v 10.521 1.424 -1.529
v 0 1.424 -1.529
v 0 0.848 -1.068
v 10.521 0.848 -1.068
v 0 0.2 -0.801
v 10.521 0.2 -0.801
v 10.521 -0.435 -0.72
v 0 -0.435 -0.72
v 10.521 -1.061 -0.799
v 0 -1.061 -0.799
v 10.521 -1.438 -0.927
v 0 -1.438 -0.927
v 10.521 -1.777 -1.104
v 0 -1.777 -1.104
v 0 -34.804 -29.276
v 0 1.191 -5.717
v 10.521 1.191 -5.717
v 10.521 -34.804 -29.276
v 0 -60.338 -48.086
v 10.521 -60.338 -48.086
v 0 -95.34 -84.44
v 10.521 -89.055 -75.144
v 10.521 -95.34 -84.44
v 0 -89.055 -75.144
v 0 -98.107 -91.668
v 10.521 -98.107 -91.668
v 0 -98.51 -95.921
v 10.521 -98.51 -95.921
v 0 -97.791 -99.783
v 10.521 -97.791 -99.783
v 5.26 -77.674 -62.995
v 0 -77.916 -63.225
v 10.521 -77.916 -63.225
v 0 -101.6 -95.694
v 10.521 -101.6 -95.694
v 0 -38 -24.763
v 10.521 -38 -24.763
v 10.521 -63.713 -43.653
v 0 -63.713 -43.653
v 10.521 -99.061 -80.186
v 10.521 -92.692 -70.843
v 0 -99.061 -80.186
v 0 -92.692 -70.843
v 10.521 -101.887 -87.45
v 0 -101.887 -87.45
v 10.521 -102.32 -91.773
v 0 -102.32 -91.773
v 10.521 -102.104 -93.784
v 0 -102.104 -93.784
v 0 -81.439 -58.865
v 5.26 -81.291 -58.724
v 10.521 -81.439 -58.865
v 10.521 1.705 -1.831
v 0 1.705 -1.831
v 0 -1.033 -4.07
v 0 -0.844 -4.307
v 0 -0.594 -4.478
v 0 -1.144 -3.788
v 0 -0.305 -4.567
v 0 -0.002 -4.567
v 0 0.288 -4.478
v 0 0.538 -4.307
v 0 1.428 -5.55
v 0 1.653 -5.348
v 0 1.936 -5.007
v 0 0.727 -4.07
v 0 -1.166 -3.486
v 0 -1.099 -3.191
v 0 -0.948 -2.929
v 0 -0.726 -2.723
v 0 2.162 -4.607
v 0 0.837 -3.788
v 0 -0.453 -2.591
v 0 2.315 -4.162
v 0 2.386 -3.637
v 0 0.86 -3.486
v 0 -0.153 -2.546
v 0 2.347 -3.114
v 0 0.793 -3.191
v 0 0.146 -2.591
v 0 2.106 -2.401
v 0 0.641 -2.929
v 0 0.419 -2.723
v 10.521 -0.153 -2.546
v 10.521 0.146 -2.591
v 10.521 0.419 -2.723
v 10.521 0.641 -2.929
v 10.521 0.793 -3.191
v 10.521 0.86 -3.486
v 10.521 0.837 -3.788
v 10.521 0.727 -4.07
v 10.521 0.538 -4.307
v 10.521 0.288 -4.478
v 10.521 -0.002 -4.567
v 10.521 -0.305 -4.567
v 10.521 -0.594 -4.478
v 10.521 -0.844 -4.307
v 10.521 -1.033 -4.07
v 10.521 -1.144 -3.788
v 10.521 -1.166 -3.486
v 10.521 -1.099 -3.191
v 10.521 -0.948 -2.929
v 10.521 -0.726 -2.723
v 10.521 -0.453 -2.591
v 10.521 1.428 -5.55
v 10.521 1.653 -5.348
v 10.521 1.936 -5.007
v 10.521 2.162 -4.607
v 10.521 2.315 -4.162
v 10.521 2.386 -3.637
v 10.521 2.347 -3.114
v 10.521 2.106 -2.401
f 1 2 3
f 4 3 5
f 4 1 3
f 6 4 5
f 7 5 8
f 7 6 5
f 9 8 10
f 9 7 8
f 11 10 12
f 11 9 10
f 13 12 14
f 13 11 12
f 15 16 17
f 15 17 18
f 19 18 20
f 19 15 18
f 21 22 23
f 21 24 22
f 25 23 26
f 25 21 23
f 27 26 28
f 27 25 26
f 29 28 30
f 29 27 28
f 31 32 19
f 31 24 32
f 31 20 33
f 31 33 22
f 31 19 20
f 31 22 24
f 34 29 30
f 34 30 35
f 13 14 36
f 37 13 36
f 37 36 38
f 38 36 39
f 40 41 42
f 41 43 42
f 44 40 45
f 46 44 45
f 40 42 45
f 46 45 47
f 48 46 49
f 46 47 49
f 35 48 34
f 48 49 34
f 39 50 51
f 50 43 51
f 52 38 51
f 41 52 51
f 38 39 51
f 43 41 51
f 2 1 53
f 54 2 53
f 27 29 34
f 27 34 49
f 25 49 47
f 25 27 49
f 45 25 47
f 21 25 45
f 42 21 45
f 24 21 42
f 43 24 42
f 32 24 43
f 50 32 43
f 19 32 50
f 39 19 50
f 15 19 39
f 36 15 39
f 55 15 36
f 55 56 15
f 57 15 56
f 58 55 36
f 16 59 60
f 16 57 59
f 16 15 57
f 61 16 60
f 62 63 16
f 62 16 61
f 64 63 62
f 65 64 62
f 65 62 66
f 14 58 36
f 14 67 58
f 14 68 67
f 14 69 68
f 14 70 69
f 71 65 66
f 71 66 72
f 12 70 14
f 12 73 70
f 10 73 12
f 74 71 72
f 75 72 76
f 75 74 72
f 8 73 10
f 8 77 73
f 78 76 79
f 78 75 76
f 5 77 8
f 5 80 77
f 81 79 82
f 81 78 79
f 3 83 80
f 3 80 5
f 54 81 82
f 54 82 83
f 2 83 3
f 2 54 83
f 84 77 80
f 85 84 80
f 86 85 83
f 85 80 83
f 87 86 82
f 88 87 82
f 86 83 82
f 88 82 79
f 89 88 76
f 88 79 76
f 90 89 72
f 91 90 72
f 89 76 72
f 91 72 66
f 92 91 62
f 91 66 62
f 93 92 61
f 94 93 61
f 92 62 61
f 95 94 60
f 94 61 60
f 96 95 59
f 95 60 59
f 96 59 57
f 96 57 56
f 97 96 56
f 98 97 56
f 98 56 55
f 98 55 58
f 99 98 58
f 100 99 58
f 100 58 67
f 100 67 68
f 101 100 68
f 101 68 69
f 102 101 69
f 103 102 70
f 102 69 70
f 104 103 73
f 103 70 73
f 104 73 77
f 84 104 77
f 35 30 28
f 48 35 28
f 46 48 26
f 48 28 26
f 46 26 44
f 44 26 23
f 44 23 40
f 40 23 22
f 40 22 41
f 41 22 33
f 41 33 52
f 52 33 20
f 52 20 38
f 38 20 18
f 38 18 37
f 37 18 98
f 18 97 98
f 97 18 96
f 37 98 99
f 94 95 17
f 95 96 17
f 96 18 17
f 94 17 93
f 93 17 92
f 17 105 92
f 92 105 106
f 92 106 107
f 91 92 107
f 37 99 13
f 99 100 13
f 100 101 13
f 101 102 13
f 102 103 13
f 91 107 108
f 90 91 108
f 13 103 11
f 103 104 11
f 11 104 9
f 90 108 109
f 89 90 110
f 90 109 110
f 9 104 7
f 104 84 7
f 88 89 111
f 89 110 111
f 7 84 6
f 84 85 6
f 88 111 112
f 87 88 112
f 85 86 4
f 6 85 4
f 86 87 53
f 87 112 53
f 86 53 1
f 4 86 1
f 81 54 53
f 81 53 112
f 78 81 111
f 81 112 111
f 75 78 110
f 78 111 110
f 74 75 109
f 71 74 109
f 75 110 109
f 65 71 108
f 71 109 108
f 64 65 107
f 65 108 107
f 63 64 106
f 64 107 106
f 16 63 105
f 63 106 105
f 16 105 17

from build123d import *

# Parameters (mm, degrees)
BOSS_EXTRUDE1_DEPTH = 10.52068
FILLET1_R           = 2.54
SKETCH5_R           = 1.016
CUT_EXTRUDE2_DEPTH  = 10.52068


with BuildPart() as part:
    # Sketch3 → Boss-Extrude1 (new body)
    with BuildSketch(Plane(origin=(0, 0, 0), x_dir=(0, 0, -1), z_dir=(1, 0, 0))):
        with BuildLine():
            Line((0, 0), (4.088945173, 3.808709935))
            add(Edge.make_bspline(
                [(4.088945173, 3.808709935), (72.921909903, -107.160022937), (99.782951364, -97.791290065)],
                knots=[0.046886932, 0.046886932, 0.046886932, 0.913353357, 0.913353357, 0.913353357], degree=2))
            Line((99.782951364, -97.791290065), (95.69400619, -101.6))
            add(Edge.make_bspline(
                [(0, 0), (68.832964729, -110.968732872), (95.69400619, -101.6)],
                knots=[0.046886932, 0.046886932, 0.046886932, 0.913353357, 0.913353357, 0.913353357], degree=2))
        make_face()
    extrude(amount=BOSS_EXTRUDE1_DEPTH)

    # Fillet1
    fillet1_edges = [part.edges().sort_by_distance(p)[0] for p in [
        (5.26034, 0, 0),
        (5.26034, 3.808709935, -4.088945173),
    ]]
    fillet(fillet1_edges, radius=FILLET1_R)

    # Sketch5 → Cut-Extrude2 (cut)
    with BuildSketch(Plane.ZY):
        with Locations((-3.562127534, -0.15319586)):
            Circle(SKETCH5_R)
    extrude(amount=-CUT_EXTRUDE2_DEPTH, mode=Mode.SUBTRACT)


solid = part.part
